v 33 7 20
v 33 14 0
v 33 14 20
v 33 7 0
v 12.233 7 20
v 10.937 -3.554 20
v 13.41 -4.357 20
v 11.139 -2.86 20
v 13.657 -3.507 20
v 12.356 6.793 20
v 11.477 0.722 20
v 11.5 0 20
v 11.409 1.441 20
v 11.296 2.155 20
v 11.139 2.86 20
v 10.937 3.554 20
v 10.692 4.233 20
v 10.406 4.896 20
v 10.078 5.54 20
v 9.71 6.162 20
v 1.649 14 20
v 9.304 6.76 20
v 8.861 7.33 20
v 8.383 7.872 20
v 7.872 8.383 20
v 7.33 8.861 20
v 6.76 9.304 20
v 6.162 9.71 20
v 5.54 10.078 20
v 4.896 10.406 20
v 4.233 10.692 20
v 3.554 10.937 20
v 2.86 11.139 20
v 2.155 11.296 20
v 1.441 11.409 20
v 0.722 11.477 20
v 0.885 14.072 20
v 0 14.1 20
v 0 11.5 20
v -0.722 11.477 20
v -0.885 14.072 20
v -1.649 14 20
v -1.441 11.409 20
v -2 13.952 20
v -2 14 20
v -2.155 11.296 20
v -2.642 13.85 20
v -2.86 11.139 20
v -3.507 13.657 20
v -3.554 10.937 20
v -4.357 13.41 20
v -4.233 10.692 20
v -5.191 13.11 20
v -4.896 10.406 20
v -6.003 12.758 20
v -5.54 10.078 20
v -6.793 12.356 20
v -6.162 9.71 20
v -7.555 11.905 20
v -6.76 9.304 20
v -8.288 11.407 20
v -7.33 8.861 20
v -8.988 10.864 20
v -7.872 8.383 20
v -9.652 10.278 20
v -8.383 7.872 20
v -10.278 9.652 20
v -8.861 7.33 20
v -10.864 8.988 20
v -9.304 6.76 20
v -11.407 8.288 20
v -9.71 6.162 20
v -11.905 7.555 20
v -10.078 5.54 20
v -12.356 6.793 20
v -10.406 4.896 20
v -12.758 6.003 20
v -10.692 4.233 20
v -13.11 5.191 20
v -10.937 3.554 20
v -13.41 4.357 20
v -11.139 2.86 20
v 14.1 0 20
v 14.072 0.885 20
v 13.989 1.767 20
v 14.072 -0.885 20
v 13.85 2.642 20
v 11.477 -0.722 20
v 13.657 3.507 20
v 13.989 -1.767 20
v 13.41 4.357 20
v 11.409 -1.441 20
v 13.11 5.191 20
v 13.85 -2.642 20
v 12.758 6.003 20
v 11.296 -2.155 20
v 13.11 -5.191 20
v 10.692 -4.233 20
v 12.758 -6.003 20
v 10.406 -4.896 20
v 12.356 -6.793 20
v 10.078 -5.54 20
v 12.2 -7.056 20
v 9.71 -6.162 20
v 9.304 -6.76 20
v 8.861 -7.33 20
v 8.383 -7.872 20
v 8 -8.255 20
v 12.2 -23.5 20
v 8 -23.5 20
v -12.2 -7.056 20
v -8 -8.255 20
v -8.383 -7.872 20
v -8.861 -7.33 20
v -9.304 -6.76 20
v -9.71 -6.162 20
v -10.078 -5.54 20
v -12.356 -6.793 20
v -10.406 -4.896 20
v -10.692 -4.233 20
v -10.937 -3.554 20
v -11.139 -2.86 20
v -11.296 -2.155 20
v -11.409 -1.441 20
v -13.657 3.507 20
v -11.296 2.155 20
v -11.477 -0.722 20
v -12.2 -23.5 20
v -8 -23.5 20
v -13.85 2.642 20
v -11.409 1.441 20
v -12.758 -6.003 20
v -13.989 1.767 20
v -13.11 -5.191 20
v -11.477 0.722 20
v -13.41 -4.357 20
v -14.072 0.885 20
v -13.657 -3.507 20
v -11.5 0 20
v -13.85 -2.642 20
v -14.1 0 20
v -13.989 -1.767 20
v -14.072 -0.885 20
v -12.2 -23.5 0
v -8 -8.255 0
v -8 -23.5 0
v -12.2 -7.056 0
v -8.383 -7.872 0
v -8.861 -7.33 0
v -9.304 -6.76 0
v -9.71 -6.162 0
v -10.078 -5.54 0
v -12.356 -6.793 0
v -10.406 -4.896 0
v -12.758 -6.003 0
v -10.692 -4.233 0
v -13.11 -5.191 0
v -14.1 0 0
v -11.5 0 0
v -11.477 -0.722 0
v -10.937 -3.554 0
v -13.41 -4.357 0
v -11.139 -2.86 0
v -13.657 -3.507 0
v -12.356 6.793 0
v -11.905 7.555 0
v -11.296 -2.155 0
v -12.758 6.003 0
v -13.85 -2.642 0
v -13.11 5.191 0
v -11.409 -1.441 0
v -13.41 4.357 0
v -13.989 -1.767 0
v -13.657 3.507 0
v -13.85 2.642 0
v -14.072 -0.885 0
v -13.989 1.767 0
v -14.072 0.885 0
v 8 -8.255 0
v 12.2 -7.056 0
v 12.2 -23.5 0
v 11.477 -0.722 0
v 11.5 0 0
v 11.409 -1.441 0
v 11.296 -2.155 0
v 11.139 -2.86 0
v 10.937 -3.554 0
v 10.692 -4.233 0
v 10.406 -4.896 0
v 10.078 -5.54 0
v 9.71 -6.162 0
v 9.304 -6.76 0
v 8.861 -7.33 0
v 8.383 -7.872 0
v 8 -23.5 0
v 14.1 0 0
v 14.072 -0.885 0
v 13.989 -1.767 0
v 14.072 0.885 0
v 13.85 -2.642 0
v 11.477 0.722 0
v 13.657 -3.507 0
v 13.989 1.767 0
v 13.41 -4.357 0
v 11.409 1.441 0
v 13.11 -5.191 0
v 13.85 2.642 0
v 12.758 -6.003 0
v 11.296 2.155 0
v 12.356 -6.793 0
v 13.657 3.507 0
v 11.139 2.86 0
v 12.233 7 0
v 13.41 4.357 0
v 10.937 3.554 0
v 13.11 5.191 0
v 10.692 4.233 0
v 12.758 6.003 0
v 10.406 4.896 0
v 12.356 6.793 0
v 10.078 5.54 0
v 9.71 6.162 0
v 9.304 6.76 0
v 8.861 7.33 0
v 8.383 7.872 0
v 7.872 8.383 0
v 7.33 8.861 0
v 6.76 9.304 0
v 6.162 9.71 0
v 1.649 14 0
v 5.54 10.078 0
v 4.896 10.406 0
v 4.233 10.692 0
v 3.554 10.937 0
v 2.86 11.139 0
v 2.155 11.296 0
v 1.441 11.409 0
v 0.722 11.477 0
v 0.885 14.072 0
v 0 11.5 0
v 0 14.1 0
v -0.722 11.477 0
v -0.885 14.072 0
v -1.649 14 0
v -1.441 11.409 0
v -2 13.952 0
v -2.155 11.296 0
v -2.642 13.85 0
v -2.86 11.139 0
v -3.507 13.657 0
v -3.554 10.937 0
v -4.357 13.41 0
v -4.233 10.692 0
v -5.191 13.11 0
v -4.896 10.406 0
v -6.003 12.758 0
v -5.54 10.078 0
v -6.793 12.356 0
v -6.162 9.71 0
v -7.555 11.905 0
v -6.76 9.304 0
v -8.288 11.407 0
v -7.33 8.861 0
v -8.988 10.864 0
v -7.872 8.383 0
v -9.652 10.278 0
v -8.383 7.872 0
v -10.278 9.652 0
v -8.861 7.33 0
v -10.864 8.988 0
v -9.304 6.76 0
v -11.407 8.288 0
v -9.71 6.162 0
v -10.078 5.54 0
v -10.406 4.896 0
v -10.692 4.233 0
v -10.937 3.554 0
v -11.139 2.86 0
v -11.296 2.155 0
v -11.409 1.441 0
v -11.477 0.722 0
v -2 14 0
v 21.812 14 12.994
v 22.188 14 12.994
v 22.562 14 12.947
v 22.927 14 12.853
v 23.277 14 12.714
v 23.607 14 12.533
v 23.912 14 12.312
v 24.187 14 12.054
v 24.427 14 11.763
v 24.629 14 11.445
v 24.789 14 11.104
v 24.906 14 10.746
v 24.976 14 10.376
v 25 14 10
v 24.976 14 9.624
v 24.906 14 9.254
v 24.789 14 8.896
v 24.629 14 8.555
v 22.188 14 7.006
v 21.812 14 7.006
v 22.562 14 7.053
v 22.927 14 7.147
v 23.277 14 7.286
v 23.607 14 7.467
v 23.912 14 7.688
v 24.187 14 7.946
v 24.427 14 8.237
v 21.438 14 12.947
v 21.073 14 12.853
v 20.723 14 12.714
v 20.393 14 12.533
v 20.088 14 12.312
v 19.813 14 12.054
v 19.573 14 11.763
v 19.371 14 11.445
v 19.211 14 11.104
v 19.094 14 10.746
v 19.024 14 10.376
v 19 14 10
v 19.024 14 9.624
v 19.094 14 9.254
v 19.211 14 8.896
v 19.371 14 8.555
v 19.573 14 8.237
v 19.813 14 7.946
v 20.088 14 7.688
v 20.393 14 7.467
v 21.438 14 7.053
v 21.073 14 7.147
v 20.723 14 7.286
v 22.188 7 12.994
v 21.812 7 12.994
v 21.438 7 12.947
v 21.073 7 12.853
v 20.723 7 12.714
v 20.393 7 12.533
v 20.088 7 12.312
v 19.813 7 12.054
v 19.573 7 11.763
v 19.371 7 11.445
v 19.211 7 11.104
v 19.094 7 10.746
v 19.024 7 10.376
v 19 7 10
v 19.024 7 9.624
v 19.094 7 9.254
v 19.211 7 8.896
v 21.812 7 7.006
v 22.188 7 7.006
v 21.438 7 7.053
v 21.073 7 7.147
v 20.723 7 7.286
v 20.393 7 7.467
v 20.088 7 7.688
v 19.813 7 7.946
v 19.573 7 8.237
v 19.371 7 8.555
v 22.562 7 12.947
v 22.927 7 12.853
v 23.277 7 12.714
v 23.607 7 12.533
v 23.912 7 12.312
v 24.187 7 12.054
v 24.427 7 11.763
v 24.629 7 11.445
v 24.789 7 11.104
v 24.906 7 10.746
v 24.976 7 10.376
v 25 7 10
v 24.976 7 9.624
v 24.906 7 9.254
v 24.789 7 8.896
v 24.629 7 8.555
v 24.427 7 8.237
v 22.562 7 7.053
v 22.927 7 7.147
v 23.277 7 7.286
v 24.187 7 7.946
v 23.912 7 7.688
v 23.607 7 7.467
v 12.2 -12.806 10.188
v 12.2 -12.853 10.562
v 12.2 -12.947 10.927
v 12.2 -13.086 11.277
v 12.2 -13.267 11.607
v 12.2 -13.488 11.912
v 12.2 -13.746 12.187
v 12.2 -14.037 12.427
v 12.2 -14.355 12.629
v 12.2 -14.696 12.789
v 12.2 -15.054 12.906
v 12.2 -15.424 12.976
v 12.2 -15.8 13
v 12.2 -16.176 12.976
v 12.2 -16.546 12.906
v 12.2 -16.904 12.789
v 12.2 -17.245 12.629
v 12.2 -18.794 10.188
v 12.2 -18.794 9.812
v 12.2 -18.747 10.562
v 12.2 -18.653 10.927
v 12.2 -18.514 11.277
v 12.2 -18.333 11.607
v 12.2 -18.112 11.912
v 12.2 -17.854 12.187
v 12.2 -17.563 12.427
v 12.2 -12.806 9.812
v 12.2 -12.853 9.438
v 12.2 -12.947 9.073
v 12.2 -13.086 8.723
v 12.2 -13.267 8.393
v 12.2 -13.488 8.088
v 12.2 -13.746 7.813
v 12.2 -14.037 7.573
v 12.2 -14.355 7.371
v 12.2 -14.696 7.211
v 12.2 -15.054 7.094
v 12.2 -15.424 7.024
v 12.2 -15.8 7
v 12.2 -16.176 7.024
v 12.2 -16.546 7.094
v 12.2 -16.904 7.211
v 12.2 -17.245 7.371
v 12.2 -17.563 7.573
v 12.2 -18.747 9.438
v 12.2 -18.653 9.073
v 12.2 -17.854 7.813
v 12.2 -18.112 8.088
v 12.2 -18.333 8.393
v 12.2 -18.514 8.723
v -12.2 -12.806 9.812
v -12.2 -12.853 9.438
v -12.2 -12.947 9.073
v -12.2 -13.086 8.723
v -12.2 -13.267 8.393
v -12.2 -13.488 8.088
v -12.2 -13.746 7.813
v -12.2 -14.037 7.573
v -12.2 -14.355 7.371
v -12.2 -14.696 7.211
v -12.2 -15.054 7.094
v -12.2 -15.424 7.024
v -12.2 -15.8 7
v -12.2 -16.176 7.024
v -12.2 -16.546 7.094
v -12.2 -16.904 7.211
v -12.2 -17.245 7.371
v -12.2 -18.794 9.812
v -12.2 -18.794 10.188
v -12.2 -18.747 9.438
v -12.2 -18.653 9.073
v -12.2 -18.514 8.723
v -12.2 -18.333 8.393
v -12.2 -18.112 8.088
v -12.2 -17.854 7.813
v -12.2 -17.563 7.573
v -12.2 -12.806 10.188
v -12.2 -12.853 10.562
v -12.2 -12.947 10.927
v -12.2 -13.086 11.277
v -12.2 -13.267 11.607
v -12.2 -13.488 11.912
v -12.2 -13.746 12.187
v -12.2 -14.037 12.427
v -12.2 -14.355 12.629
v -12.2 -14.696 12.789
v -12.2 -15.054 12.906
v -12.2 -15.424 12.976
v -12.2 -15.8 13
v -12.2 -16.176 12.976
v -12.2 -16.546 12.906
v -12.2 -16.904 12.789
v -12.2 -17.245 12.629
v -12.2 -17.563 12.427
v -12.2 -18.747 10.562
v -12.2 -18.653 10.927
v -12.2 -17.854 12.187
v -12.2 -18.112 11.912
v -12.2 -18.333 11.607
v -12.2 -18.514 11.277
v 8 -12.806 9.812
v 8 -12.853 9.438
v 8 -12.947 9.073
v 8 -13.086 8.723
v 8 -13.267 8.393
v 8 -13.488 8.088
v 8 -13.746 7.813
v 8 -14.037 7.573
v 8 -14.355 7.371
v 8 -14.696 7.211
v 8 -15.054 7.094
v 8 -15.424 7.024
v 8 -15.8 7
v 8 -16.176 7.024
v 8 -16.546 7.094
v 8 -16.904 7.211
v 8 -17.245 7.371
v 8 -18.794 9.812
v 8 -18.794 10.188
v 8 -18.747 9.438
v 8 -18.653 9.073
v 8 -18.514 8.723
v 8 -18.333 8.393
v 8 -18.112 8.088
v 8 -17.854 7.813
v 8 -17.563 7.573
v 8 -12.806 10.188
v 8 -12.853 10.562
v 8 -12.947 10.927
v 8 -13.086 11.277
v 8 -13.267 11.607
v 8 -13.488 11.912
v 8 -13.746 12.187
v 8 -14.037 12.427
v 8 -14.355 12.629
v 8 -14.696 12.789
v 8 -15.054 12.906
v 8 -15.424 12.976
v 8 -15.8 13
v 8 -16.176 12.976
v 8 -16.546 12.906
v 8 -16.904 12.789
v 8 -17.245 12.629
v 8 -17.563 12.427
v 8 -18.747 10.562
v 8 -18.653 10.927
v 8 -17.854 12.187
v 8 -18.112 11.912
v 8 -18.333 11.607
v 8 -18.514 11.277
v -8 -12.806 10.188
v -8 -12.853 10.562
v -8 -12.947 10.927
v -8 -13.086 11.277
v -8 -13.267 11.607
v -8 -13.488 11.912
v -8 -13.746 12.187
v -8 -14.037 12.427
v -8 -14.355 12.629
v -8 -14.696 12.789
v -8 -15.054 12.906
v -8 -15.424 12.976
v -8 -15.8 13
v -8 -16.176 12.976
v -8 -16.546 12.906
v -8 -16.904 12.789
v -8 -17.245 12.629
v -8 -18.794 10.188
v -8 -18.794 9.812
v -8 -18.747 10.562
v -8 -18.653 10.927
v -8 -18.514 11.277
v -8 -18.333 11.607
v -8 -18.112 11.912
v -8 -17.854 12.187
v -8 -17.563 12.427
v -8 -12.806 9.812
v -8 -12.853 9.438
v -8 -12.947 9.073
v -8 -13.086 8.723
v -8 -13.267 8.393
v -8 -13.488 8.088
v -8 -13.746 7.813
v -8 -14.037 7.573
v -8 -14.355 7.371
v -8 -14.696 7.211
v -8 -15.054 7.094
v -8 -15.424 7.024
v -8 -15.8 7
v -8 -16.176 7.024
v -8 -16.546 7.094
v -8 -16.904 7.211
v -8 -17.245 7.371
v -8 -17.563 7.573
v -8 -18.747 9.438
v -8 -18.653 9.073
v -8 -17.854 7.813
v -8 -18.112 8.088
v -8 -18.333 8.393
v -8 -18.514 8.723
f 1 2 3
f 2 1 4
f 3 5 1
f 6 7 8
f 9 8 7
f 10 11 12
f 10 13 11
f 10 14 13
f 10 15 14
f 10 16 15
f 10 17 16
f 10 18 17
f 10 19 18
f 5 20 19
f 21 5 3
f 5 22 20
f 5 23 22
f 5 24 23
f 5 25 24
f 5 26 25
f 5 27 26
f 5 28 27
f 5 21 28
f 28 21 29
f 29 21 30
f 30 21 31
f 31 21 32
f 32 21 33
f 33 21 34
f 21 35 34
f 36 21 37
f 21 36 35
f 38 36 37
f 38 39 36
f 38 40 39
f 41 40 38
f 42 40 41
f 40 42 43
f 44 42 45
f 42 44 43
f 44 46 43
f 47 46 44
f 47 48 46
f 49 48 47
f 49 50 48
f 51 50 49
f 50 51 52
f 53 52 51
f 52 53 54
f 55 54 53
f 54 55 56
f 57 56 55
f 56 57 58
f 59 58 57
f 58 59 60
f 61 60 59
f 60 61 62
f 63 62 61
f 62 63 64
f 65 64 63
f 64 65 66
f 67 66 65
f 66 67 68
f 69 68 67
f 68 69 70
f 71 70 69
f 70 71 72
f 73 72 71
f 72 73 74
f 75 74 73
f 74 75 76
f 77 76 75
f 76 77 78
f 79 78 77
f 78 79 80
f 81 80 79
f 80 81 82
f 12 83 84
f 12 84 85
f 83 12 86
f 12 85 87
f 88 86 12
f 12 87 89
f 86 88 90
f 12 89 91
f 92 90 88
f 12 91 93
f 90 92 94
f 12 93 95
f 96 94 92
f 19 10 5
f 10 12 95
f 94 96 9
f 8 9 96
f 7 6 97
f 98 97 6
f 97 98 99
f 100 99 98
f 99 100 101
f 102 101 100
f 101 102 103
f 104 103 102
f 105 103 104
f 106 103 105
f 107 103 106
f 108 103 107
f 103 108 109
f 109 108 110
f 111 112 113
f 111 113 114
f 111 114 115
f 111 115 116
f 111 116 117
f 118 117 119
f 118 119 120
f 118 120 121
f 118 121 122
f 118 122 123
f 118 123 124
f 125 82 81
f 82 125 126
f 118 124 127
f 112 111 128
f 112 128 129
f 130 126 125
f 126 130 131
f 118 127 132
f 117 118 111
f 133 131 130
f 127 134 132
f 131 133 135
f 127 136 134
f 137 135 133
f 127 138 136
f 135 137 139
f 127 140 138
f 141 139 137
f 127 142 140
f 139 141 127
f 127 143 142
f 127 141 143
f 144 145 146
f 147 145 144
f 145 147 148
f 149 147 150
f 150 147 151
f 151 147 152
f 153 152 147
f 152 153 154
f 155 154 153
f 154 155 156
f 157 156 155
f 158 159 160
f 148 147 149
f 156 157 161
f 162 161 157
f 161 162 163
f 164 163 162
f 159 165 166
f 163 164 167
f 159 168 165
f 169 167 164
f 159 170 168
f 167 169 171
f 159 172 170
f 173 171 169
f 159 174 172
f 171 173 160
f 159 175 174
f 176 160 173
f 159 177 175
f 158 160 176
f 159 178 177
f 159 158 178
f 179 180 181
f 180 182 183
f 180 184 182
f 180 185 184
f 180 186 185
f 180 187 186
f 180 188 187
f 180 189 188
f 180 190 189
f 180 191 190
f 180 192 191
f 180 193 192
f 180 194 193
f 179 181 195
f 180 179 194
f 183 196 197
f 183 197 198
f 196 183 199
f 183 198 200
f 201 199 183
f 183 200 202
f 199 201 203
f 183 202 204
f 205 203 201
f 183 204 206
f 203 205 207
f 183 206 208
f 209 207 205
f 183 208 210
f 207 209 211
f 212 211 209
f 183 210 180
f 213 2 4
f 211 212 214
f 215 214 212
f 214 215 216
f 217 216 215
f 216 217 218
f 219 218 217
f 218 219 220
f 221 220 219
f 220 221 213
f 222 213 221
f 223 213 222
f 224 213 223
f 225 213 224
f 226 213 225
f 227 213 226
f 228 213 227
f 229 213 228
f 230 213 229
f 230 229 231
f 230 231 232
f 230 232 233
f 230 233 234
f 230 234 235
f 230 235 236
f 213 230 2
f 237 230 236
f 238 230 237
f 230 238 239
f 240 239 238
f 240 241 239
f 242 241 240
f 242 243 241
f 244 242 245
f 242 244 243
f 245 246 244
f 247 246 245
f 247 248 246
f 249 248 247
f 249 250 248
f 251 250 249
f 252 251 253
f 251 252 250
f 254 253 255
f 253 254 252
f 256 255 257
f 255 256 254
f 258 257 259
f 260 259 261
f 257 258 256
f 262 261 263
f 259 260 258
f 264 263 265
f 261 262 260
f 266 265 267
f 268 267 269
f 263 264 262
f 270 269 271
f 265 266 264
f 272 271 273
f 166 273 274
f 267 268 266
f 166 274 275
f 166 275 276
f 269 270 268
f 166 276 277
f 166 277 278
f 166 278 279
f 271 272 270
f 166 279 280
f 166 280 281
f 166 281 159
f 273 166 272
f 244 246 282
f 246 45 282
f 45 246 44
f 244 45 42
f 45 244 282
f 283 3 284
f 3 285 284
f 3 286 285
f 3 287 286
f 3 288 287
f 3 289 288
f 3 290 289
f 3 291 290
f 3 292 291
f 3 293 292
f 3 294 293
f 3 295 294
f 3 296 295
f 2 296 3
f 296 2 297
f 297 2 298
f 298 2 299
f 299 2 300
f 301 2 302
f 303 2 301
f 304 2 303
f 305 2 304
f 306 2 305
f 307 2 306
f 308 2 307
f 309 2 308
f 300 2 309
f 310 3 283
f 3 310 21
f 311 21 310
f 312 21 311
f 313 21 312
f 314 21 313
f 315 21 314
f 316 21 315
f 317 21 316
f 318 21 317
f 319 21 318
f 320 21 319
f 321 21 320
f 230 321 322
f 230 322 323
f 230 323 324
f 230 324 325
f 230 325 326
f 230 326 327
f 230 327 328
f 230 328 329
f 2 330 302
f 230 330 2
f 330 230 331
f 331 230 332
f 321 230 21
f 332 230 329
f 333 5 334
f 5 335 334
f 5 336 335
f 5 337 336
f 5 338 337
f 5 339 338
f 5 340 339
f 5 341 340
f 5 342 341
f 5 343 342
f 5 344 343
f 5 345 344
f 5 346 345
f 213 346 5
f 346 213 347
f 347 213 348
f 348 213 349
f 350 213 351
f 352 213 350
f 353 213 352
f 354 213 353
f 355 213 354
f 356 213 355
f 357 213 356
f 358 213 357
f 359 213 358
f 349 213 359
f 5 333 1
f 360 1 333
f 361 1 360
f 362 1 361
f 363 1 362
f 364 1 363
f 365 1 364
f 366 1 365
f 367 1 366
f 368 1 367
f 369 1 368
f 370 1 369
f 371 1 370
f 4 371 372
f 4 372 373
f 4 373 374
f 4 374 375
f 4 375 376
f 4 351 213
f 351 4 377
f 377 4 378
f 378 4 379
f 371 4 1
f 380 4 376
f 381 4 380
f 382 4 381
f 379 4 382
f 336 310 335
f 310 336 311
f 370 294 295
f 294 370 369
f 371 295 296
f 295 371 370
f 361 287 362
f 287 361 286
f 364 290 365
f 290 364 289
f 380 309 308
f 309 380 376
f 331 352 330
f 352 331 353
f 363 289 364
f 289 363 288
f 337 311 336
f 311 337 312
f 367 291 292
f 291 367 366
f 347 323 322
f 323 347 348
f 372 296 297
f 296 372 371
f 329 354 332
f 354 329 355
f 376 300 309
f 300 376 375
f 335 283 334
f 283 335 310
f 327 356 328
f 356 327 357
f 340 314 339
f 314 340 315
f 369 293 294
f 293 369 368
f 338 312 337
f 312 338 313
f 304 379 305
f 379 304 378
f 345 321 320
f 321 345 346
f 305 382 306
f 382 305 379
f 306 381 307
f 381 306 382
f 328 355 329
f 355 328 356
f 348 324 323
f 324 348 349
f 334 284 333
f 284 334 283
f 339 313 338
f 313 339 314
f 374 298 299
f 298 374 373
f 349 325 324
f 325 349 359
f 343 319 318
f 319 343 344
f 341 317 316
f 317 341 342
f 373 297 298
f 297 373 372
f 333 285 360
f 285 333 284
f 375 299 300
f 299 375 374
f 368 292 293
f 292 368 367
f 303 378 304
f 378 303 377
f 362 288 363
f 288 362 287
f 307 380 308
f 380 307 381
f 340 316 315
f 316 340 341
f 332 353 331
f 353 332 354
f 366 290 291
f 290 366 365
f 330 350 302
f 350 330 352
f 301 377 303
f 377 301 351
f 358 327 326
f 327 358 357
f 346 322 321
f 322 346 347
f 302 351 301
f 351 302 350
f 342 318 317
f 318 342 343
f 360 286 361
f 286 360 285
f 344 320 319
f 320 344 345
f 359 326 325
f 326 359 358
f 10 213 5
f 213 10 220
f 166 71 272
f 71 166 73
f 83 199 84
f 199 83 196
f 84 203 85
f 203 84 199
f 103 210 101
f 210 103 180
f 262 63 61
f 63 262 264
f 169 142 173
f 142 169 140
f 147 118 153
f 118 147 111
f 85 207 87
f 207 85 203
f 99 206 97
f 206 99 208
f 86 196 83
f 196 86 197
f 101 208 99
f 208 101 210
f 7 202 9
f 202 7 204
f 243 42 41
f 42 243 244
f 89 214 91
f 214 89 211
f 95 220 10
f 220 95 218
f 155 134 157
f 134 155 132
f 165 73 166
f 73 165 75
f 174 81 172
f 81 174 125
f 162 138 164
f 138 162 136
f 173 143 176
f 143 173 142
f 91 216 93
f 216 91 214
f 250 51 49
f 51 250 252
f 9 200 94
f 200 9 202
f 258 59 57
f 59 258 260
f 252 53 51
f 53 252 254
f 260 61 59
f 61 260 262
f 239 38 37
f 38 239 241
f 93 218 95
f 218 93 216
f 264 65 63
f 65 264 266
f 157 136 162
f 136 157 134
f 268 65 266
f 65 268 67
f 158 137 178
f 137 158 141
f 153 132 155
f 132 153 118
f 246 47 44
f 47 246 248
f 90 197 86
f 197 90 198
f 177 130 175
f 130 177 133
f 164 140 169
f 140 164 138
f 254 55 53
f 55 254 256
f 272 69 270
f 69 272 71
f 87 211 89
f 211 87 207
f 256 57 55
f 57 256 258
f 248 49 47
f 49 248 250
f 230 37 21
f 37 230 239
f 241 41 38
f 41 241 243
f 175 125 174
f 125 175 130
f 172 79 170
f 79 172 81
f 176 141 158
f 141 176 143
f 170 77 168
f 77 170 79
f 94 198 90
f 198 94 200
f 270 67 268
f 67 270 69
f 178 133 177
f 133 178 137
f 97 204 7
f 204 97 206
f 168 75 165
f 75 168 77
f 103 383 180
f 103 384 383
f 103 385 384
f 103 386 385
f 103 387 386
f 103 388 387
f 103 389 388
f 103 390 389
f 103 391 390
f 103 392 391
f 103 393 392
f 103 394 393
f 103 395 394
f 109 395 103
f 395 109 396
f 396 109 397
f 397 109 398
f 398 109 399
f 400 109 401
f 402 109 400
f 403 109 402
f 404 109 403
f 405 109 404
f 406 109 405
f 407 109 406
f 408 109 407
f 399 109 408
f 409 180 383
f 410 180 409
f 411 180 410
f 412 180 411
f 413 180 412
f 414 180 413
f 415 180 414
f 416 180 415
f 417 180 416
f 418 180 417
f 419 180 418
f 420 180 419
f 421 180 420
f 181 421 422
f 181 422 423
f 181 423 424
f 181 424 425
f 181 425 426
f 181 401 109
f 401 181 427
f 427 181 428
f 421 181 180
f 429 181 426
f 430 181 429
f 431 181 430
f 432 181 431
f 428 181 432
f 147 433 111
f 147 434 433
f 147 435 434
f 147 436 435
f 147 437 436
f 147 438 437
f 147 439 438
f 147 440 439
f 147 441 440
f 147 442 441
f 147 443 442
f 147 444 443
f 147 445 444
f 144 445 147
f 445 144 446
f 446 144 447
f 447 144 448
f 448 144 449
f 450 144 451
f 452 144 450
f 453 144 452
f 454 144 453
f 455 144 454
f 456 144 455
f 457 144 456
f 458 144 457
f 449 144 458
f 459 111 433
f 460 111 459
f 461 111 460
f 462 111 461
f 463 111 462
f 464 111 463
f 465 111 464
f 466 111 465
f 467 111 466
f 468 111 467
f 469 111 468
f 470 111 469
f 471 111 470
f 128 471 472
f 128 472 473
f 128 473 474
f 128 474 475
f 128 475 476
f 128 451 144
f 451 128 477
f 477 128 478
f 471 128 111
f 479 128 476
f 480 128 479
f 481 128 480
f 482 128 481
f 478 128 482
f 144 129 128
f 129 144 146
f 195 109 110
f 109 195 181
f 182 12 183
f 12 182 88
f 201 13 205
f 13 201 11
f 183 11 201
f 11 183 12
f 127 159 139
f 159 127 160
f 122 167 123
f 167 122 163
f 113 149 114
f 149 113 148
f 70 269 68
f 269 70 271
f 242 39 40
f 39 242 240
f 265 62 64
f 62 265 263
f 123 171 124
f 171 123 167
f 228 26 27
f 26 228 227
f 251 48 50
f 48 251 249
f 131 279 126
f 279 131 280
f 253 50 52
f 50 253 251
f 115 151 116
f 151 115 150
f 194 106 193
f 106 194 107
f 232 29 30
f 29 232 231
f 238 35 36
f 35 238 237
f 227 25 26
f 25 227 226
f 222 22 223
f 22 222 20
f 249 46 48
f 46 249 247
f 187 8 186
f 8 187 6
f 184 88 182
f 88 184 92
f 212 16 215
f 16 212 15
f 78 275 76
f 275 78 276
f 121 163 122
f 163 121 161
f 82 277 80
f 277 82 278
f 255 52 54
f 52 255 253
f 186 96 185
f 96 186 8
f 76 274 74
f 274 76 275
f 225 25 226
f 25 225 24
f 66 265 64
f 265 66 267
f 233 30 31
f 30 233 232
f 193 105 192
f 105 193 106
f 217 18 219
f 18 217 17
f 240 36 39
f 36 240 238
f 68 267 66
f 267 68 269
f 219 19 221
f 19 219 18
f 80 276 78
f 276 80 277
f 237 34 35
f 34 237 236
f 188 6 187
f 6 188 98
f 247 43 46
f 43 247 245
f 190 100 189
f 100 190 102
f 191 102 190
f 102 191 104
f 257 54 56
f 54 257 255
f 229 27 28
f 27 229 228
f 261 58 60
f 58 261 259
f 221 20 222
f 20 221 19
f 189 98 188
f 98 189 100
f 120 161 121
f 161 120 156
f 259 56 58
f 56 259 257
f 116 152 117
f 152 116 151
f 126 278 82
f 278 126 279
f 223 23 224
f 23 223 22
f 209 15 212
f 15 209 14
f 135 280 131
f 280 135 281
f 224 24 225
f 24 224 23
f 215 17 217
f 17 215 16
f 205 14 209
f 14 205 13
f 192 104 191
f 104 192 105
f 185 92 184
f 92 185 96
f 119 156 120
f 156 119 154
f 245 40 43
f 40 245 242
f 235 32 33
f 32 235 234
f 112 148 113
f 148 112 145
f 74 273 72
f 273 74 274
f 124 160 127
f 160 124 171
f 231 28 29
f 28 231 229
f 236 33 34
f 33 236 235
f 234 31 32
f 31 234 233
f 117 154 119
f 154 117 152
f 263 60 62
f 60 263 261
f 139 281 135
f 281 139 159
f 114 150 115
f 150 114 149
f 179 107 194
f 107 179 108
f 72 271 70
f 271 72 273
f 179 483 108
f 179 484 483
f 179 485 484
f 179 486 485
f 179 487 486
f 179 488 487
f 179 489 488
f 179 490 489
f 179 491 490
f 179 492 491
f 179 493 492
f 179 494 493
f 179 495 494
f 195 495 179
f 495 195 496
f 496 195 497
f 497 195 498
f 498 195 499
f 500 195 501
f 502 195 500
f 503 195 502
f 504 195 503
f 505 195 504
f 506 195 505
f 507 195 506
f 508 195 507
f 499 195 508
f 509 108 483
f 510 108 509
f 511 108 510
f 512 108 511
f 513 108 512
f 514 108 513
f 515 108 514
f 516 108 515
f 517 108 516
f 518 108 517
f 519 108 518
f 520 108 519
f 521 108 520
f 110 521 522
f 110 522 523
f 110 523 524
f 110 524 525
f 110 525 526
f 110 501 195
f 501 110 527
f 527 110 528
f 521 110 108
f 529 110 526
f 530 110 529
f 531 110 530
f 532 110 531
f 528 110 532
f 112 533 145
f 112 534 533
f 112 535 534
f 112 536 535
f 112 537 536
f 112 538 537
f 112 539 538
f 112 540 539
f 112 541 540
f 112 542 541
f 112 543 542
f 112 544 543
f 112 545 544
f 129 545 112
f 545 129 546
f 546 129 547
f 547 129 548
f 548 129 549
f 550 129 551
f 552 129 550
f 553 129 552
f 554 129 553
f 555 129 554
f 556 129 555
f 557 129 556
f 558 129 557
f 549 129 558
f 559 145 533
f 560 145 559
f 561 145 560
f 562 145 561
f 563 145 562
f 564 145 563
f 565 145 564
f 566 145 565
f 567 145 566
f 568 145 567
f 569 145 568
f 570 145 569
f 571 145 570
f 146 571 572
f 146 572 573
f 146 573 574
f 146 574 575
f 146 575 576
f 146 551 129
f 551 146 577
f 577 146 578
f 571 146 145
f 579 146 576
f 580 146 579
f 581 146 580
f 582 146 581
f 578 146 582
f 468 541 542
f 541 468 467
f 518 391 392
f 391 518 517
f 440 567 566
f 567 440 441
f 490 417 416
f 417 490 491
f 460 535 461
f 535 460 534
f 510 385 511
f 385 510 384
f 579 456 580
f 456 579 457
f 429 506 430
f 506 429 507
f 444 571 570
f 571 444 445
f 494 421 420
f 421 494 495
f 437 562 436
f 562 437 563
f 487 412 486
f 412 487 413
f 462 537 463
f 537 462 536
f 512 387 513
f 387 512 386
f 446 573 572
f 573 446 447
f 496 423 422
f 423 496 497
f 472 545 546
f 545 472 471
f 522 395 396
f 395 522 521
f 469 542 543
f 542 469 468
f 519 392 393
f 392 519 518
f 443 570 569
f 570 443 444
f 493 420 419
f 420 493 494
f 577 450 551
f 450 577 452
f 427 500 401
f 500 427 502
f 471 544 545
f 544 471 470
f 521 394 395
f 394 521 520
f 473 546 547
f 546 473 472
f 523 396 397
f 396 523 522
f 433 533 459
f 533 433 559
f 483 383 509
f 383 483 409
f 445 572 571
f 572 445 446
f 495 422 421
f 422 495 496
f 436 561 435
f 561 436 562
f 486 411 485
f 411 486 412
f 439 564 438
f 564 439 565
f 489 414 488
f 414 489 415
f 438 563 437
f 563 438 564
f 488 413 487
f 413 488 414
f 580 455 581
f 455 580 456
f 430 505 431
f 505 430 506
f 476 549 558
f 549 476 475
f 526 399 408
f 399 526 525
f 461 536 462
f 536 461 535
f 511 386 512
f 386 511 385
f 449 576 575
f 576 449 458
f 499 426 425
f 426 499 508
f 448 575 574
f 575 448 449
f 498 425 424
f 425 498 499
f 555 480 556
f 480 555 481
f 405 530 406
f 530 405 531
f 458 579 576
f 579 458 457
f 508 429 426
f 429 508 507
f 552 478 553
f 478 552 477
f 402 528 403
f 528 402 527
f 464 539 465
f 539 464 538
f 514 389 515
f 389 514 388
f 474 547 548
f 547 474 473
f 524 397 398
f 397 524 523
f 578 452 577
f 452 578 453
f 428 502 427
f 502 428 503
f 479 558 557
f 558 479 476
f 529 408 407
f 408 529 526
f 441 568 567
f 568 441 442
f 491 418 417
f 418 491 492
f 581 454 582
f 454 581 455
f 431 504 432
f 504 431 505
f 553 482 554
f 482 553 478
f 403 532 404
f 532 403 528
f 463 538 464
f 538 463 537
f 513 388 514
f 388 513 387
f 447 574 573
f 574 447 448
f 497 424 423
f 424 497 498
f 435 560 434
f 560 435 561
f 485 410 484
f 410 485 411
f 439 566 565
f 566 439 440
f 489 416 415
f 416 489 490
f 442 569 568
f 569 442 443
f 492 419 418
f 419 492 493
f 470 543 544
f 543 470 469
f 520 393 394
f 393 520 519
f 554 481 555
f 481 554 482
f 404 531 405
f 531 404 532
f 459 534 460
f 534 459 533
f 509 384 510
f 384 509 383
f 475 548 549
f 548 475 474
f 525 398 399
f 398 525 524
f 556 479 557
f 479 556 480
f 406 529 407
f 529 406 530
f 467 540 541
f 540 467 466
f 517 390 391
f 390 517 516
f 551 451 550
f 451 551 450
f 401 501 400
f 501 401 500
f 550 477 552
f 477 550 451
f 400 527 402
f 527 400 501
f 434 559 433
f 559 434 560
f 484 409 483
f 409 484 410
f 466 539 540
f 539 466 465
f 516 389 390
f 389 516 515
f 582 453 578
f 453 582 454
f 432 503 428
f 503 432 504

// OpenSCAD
shaftDiameter = 23 ;
clampWidth = 20 ;
clampThickness = 2.6 ;
clampLegLengthFromShaft = 12 ;
clampLegThickness = clampThickness + 1.6 ; // default is 'clampThickness' to keep it the same thickness as the clamp
clampLegGap = 16 ;
clampToClampScrewCenter = (clampLegLengthFromShaft - clampThickness) / 2 - 3 ; //using '(clampLegLengthFromShaft - clampThickness) / 2' nearly centres this hole on the clamp leg
clampScrewDiameter = 6 ;
shaftToMountPlate = 0 ;
mountPlateThickness = 5.7 ;
mountPlateLength = 38 ;
mountHoleSpacing = 30 ;
mountHoleDiameter = 3.5 ;
screwHoleSmoothness = 50 ; //6 = printable vertically. Applies to mount plate screw holes and clamp leg screw holes
clampSmoothness = 100 ;

//clampWithMountPlate();

clamp();

module clampWithMountPlate(){
    clamp();
	union(){
		translate([0,shaftDiameter / 2 + shaftToMountPlate + mountPlateThickness / 2,clampWidth / 2])
			difference(){
				translate([18,-1,0]) cube([mountPlateLength,mountPlateThickness,clampWidth], center = true);
				translate([-mountHoleSpacing / 2,0,0]) rotate([90,0,0]) cylinder(r = mountHoleDiameter / 2, h = mountPlateThickness + 2, center = true, $fn = screwHoleSmoothness);
				translate([mountHoleSpacing / 2,0,0]) rotate([90,0,0]) cylinder(r = mountHoleDiameter / 2, h = mountPlateThickness + 2, center = true, $fn = screwHoleSmoothness);
			}
		
	}
}

module clamp(){
    $fn=50;
    
	difference(){
		union(){
			cylinder(r = shaftDiameter / 2 + clampThickness, h = clampWidth, $fn = clampSmoothness);
			translate([0,-(shaftDiameter / 2 + clampLegLengthFromShaft) / 2,clampWidth / 2]) cube([clampLegThickness * 2 + clampLegGap, shaftDiameter / 2 + clampLegLengthFromShaft,clampWidth], center = true);
            difference() {
        translate([-2,7,0]) cube([35,7,20], false);
    translate([22,20,10]) rotate([90,0,0]) cylinder(20,3,3);
    
    }
		}
			translate([0,0,-1]) cylinder(r = shaftDiameter / 2,h = clampWidth + 2, $fn = clampSmoothness);			
			translate([0, -(shaftDiameter / 4 + clampLegLengthFromShaft ) + 0.1, clampWidth / 2]) cube([clampLegGap, shaftDiameter / 2 + clampLegLengthFromShaft * 2, clampWidth + 2], center = true);
			translate([0, -(shaftDiameter / 2 + clampThickness + clampToClampScrewCenter ), clampWidth / 2]) rotate([0, 90, 0]) cylinder(r = clampScrewDiameter / 2, h = clampLegThickness * 2 + clampLegGap + 2,center = true, $fn = screwHoleSmoothness);
        
	}
}
